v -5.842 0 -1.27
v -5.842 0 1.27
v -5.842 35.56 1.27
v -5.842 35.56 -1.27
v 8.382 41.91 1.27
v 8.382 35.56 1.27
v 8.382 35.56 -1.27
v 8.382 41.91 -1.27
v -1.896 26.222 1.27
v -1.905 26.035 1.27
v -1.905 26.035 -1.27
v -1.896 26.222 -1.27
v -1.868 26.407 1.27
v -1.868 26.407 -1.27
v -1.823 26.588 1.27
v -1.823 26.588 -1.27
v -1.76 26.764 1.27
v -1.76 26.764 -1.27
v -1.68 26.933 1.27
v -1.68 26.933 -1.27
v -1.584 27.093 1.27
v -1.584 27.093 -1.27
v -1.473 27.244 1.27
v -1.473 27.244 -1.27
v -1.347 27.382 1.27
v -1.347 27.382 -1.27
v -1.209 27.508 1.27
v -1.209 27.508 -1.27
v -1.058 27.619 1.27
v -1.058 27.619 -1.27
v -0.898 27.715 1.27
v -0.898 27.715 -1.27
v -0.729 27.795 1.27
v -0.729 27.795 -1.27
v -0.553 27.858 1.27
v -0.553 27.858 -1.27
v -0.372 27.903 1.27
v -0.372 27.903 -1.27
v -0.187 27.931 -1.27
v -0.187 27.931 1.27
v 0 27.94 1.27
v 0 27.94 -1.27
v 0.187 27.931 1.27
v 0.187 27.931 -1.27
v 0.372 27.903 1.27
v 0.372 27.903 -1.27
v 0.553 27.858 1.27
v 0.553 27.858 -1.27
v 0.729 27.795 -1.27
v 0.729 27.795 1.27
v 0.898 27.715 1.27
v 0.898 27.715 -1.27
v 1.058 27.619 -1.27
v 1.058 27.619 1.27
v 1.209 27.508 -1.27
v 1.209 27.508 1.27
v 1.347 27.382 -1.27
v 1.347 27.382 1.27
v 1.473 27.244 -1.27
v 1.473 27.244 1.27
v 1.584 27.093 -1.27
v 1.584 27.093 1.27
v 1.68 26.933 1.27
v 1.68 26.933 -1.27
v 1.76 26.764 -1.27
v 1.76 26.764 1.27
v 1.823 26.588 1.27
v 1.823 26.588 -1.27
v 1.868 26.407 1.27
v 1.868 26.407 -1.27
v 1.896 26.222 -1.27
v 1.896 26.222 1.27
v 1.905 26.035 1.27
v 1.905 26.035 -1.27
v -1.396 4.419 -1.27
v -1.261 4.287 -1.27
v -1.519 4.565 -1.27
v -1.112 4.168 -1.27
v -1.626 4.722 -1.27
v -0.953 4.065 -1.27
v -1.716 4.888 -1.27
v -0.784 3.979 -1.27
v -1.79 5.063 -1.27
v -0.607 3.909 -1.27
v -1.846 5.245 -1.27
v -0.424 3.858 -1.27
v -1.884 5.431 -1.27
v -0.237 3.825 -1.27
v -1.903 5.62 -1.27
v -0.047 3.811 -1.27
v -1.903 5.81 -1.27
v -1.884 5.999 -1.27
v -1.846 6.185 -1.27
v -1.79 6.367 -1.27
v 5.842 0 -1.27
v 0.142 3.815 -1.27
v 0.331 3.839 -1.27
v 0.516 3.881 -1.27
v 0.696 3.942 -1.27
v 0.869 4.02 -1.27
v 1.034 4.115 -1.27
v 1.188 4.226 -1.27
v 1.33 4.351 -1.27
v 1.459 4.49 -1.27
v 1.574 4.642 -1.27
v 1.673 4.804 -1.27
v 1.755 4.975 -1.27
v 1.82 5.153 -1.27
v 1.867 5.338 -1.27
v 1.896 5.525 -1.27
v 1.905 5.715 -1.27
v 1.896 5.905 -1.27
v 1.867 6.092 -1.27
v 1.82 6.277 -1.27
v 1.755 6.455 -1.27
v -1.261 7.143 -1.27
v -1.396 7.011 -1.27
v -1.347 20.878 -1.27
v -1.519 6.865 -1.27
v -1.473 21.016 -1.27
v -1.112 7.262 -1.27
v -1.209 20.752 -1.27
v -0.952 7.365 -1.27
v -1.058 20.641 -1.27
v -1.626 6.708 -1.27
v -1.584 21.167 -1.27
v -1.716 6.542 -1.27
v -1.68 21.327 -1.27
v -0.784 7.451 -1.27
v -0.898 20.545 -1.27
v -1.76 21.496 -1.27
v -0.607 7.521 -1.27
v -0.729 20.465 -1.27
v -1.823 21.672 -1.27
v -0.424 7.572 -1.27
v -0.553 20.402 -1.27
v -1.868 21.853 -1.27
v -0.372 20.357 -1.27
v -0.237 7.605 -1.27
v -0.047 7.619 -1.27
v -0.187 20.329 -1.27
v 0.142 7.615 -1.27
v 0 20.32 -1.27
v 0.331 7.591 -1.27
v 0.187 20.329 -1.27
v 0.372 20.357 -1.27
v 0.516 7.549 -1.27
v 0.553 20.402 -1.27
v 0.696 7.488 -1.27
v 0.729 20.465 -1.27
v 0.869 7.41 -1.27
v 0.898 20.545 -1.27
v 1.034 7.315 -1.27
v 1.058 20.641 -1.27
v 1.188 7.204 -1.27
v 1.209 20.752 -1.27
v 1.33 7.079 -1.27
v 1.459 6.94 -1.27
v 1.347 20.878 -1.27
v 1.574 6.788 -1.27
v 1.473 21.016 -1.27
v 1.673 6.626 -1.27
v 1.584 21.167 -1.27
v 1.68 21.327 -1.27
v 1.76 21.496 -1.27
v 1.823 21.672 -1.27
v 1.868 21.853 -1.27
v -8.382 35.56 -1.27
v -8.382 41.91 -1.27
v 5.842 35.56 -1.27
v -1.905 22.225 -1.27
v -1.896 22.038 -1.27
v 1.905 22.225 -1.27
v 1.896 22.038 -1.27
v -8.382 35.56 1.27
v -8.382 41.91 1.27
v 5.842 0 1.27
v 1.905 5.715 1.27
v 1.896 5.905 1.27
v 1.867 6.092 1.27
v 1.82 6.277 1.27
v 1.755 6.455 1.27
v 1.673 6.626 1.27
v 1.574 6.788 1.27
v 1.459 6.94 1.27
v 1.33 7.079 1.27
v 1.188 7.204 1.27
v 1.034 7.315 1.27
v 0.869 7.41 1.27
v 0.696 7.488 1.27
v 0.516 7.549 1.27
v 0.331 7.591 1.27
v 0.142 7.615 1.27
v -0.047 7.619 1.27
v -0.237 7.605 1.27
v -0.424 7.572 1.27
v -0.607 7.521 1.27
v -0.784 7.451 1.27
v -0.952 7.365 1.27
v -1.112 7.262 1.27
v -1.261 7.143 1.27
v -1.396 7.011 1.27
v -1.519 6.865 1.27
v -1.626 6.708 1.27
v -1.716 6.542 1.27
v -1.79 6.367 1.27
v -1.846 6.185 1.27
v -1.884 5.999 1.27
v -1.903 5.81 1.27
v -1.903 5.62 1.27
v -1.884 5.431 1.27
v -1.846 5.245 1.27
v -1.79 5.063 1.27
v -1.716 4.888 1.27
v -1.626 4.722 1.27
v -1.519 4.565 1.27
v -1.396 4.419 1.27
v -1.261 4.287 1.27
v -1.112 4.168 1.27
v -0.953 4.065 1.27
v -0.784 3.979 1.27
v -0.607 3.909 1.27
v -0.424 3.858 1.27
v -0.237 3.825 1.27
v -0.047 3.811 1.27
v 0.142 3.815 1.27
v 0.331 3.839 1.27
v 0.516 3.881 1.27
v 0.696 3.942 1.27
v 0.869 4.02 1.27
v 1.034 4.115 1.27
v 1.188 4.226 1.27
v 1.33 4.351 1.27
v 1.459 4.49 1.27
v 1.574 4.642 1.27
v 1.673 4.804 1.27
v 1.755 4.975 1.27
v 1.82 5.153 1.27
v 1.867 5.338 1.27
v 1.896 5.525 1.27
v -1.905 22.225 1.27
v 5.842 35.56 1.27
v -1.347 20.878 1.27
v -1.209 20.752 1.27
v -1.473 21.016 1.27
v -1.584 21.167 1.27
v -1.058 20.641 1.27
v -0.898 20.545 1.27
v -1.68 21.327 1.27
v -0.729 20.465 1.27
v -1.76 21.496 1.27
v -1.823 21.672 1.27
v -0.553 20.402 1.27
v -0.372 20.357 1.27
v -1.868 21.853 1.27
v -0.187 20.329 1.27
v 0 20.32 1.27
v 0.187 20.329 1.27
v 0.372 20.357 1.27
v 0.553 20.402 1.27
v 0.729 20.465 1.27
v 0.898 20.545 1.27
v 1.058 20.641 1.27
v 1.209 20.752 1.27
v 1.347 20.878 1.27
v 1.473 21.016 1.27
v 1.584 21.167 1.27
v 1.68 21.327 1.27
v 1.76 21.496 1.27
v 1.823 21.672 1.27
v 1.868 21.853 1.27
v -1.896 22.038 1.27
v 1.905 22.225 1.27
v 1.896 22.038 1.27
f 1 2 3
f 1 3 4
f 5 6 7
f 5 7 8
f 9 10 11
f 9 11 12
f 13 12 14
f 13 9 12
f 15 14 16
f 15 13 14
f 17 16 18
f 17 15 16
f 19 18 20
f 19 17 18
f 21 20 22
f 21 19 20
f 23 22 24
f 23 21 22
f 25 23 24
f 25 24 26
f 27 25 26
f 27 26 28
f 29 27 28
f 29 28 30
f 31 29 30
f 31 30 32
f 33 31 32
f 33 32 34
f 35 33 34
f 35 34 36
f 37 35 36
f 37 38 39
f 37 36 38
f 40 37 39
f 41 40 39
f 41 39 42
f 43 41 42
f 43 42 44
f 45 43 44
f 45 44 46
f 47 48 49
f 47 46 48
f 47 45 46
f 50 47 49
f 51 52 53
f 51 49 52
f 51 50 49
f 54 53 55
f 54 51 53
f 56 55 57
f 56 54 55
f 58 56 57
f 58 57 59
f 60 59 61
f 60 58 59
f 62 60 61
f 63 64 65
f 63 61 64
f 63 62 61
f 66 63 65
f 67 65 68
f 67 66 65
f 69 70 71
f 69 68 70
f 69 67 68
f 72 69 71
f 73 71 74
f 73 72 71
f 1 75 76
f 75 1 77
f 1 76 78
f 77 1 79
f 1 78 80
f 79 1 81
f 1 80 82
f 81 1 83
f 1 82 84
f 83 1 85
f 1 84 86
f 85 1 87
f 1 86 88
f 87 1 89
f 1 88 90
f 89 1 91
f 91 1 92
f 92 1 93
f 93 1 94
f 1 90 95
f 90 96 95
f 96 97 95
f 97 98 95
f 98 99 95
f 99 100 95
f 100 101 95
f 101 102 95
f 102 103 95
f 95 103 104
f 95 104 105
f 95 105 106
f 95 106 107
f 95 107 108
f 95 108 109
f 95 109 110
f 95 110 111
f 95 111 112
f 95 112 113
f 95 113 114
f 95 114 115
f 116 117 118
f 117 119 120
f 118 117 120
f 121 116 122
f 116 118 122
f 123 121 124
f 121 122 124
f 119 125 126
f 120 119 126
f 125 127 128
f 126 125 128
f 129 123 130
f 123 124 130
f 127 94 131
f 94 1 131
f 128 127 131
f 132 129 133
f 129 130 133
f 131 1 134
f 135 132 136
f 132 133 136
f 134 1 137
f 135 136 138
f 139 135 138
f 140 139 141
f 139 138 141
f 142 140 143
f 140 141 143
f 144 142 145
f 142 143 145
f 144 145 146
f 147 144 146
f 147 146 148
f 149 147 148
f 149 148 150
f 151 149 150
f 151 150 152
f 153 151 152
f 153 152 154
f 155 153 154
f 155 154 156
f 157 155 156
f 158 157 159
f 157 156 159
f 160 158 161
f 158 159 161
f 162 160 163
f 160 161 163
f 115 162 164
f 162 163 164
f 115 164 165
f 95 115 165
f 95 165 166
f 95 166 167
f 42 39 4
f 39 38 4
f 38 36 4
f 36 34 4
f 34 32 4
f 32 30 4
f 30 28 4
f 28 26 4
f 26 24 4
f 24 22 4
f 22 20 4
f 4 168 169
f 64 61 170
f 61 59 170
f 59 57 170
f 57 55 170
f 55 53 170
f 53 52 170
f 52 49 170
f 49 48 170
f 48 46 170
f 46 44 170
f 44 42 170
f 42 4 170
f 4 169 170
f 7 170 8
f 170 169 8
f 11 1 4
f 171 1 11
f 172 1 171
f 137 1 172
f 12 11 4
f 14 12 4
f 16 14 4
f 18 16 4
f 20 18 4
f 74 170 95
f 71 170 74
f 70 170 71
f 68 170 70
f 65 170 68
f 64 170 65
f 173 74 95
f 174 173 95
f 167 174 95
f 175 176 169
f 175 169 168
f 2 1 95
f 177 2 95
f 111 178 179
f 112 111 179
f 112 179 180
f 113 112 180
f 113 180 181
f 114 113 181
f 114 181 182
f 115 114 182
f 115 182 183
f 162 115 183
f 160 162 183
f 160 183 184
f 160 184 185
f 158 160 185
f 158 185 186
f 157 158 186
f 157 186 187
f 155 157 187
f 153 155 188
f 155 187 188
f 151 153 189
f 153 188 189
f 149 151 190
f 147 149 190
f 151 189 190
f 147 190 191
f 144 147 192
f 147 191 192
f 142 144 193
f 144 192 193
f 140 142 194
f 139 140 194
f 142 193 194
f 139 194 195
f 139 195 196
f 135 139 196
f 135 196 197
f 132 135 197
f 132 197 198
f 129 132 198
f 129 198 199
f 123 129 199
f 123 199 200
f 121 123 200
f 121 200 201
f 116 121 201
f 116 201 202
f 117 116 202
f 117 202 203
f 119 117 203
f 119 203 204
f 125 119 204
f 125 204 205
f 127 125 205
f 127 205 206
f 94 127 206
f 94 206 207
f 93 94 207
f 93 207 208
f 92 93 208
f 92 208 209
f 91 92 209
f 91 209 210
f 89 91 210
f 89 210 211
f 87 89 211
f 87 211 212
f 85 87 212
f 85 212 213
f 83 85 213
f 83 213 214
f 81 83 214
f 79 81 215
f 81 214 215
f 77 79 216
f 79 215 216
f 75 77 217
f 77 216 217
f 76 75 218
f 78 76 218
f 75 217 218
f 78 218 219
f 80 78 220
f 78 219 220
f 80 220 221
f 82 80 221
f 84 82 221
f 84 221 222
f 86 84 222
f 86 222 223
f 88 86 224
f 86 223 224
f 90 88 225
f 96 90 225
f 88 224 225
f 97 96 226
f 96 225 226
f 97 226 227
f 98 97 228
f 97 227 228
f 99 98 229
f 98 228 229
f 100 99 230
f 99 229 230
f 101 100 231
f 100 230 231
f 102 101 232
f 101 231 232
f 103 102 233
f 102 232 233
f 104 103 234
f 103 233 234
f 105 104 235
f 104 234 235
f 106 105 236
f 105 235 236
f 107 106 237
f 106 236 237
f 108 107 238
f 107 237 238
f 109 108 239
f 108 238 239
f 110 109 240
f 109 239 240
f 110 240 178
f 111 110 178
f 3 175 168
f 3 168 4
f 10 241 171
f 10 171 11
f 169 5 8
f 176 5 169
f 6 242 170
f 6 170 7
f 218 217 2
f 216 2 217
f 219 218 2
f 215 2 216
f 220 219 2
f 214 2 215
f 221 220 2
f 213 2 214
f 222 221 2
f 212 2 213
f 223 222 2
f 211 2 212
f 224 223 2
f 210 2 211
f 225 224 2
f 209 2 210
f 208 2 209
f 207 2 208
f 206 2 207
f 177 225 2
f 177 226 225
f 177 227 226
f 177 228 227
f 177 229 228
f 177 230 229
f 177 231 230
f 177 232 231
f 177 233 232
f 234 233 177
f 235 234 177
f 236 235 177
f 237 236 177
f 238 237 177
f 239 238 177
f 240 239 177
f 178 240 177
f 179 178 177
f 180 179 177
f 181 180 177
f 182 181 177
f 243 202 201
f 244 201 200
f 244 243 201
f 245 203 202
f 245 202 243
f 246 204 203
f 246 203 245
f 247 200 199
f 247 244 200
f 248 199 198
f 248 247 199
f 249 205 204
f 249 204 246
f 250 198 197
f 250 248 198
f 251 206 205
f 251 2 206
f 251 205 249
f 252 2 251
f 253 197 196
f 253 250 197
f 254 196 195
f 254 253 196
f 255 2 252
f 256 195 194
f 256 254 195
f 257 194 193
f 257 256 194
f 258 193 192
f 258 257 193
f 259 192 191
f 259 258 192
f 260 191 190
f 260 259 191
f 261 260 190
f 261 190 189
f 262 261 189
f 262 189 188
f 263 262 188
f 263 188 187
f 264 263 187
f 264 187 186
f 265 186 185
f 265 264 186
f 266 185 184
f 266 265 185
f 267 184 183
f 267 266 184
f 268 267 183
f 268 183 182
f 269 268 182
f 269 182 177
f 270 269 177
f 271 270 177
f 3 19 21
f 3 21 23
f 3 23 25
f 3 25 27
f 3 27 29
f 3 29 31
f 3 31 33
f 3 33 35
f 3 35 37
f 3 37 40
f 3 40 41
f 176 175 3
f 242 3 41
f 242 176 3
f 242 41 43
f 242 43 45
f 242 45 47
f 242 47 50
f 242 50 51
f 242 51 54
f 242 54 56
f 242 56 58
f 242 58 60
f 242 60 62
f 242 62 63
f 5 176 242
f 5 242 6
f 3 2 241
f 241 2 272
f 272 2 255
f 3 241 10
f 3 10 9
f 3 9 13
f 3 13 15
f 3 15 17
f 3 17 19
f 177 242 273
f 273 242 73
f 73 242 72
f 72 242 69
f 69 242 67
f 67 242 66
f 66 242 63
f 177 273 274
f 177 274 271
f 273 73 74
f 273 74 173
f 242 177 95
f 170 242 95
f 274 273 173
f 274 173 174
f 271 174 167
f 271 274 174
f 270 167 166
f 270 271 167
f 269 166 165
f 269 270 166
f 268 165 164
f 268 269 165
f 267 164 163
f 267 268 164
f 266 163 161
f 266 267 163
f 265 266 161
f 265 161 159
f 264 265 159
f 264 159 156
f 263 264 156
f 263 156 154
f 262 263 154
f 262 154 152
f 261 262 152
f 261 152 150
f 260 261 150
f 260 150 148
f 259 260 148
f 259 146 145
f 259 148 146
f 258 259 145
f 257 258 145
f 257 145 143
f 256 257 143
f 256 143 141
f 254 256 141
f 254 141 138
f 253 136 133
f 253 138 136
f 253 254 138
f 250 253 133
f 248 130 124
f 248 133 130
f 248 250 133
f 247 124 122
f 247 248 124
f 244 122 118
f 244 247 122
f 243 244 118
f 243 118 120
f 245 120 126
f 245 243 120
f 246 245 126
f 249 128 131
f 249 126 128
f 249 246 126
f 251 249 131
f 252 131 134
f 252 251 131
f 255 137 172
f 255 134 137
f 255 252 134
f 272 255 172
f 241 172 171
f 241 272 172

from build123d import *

# Parameters (mm, degrees)
SKETCH1_W           = 11.684
SKETCH1_H           = 2.54
BOSS_EXTRUDE1_DEPTH = 35.56
BOSS_EXTRUDE2_DEPTH = 2.54
CUT_EXTRUDE1_REACH  = 4.54
SKETCH3_R           = 1.905


with BuildPart() as part:
    # Sketch1 → Boss-Extrude1 (new body)
    with BuildSketch(Plane(origin=(0, 0, 0), x_dir=(1, 0, 0), z_dir=(0, 1, 0))):
        Rectangle(SKETCH1_W, SKETCH1_H)
    extrude(amount=BOSS_EXTRUDE1_DEPTH)

    # Sketch2 → Boss-Extrude2 (add)
    with BuildSketch(Plane.XY.offset(1.27)):
        Polygon((-8.382, 35.56), (-5.842, 35.56), (5.842, 35.56), (8.382, 35.56), (8.382, 41.91), (-8.382, 41.91), align=None)
    extrude(amount=-BOSS_EXTRUDE2_DEPTH)

    # Sketch3 → Cut-Extrude1 (cut, up to next)
    with BuildSketch(Plane.XY.offset(1.27), mode=Mode.PRIVATE) as cut_extrude1_sk1:
        with Locations((0, 5.715)):
            Circle(SKETCH3_R)
    cut_extrude1_tool1 = extrude(cut_extrude1_sk1.sketch, amount=-CUT_EXTRUDE1_REACH, mode=Mode.PRIVATE) & part.part
    add(cut_extrude1_tool1.solids().sort_by_distance((0, 5.715, 1.27))[0], mode=Mode.SUBTRACT)
    # Sketch3 → Cut-Extrude1 (cut, up to next)
    with BuildSketch(Plane.XY.offset(1.27), mode=Mode.PRIVATE) as cut_extrude1_sk2:
        with BuildLine():
            Line((1.905, 26.035), (1.905, 22.225))
            ThreePointArc((1.905, 22.225), (0, 20.32), (-1.905, 22.225))
            Line((-1.905, 22.225), (-1.905, 26.035))
            ThreePointArc((-1.905, 26.035), (0, 27.94), (1.905, 26.035))
        make_face()
    cut_extrude1_tool2 = extrude(cut_extrude1_sk2.sketch, amount=-CUT_EXTRUDE1_REACH, mode=Mode.PRIVATE) & part.part
    add(cut_extrude1_tool2.solids().sort_by_distance((0, 24.13, 1.27))[0], mode=Mode.SUBTRACT)


solid = part.part
